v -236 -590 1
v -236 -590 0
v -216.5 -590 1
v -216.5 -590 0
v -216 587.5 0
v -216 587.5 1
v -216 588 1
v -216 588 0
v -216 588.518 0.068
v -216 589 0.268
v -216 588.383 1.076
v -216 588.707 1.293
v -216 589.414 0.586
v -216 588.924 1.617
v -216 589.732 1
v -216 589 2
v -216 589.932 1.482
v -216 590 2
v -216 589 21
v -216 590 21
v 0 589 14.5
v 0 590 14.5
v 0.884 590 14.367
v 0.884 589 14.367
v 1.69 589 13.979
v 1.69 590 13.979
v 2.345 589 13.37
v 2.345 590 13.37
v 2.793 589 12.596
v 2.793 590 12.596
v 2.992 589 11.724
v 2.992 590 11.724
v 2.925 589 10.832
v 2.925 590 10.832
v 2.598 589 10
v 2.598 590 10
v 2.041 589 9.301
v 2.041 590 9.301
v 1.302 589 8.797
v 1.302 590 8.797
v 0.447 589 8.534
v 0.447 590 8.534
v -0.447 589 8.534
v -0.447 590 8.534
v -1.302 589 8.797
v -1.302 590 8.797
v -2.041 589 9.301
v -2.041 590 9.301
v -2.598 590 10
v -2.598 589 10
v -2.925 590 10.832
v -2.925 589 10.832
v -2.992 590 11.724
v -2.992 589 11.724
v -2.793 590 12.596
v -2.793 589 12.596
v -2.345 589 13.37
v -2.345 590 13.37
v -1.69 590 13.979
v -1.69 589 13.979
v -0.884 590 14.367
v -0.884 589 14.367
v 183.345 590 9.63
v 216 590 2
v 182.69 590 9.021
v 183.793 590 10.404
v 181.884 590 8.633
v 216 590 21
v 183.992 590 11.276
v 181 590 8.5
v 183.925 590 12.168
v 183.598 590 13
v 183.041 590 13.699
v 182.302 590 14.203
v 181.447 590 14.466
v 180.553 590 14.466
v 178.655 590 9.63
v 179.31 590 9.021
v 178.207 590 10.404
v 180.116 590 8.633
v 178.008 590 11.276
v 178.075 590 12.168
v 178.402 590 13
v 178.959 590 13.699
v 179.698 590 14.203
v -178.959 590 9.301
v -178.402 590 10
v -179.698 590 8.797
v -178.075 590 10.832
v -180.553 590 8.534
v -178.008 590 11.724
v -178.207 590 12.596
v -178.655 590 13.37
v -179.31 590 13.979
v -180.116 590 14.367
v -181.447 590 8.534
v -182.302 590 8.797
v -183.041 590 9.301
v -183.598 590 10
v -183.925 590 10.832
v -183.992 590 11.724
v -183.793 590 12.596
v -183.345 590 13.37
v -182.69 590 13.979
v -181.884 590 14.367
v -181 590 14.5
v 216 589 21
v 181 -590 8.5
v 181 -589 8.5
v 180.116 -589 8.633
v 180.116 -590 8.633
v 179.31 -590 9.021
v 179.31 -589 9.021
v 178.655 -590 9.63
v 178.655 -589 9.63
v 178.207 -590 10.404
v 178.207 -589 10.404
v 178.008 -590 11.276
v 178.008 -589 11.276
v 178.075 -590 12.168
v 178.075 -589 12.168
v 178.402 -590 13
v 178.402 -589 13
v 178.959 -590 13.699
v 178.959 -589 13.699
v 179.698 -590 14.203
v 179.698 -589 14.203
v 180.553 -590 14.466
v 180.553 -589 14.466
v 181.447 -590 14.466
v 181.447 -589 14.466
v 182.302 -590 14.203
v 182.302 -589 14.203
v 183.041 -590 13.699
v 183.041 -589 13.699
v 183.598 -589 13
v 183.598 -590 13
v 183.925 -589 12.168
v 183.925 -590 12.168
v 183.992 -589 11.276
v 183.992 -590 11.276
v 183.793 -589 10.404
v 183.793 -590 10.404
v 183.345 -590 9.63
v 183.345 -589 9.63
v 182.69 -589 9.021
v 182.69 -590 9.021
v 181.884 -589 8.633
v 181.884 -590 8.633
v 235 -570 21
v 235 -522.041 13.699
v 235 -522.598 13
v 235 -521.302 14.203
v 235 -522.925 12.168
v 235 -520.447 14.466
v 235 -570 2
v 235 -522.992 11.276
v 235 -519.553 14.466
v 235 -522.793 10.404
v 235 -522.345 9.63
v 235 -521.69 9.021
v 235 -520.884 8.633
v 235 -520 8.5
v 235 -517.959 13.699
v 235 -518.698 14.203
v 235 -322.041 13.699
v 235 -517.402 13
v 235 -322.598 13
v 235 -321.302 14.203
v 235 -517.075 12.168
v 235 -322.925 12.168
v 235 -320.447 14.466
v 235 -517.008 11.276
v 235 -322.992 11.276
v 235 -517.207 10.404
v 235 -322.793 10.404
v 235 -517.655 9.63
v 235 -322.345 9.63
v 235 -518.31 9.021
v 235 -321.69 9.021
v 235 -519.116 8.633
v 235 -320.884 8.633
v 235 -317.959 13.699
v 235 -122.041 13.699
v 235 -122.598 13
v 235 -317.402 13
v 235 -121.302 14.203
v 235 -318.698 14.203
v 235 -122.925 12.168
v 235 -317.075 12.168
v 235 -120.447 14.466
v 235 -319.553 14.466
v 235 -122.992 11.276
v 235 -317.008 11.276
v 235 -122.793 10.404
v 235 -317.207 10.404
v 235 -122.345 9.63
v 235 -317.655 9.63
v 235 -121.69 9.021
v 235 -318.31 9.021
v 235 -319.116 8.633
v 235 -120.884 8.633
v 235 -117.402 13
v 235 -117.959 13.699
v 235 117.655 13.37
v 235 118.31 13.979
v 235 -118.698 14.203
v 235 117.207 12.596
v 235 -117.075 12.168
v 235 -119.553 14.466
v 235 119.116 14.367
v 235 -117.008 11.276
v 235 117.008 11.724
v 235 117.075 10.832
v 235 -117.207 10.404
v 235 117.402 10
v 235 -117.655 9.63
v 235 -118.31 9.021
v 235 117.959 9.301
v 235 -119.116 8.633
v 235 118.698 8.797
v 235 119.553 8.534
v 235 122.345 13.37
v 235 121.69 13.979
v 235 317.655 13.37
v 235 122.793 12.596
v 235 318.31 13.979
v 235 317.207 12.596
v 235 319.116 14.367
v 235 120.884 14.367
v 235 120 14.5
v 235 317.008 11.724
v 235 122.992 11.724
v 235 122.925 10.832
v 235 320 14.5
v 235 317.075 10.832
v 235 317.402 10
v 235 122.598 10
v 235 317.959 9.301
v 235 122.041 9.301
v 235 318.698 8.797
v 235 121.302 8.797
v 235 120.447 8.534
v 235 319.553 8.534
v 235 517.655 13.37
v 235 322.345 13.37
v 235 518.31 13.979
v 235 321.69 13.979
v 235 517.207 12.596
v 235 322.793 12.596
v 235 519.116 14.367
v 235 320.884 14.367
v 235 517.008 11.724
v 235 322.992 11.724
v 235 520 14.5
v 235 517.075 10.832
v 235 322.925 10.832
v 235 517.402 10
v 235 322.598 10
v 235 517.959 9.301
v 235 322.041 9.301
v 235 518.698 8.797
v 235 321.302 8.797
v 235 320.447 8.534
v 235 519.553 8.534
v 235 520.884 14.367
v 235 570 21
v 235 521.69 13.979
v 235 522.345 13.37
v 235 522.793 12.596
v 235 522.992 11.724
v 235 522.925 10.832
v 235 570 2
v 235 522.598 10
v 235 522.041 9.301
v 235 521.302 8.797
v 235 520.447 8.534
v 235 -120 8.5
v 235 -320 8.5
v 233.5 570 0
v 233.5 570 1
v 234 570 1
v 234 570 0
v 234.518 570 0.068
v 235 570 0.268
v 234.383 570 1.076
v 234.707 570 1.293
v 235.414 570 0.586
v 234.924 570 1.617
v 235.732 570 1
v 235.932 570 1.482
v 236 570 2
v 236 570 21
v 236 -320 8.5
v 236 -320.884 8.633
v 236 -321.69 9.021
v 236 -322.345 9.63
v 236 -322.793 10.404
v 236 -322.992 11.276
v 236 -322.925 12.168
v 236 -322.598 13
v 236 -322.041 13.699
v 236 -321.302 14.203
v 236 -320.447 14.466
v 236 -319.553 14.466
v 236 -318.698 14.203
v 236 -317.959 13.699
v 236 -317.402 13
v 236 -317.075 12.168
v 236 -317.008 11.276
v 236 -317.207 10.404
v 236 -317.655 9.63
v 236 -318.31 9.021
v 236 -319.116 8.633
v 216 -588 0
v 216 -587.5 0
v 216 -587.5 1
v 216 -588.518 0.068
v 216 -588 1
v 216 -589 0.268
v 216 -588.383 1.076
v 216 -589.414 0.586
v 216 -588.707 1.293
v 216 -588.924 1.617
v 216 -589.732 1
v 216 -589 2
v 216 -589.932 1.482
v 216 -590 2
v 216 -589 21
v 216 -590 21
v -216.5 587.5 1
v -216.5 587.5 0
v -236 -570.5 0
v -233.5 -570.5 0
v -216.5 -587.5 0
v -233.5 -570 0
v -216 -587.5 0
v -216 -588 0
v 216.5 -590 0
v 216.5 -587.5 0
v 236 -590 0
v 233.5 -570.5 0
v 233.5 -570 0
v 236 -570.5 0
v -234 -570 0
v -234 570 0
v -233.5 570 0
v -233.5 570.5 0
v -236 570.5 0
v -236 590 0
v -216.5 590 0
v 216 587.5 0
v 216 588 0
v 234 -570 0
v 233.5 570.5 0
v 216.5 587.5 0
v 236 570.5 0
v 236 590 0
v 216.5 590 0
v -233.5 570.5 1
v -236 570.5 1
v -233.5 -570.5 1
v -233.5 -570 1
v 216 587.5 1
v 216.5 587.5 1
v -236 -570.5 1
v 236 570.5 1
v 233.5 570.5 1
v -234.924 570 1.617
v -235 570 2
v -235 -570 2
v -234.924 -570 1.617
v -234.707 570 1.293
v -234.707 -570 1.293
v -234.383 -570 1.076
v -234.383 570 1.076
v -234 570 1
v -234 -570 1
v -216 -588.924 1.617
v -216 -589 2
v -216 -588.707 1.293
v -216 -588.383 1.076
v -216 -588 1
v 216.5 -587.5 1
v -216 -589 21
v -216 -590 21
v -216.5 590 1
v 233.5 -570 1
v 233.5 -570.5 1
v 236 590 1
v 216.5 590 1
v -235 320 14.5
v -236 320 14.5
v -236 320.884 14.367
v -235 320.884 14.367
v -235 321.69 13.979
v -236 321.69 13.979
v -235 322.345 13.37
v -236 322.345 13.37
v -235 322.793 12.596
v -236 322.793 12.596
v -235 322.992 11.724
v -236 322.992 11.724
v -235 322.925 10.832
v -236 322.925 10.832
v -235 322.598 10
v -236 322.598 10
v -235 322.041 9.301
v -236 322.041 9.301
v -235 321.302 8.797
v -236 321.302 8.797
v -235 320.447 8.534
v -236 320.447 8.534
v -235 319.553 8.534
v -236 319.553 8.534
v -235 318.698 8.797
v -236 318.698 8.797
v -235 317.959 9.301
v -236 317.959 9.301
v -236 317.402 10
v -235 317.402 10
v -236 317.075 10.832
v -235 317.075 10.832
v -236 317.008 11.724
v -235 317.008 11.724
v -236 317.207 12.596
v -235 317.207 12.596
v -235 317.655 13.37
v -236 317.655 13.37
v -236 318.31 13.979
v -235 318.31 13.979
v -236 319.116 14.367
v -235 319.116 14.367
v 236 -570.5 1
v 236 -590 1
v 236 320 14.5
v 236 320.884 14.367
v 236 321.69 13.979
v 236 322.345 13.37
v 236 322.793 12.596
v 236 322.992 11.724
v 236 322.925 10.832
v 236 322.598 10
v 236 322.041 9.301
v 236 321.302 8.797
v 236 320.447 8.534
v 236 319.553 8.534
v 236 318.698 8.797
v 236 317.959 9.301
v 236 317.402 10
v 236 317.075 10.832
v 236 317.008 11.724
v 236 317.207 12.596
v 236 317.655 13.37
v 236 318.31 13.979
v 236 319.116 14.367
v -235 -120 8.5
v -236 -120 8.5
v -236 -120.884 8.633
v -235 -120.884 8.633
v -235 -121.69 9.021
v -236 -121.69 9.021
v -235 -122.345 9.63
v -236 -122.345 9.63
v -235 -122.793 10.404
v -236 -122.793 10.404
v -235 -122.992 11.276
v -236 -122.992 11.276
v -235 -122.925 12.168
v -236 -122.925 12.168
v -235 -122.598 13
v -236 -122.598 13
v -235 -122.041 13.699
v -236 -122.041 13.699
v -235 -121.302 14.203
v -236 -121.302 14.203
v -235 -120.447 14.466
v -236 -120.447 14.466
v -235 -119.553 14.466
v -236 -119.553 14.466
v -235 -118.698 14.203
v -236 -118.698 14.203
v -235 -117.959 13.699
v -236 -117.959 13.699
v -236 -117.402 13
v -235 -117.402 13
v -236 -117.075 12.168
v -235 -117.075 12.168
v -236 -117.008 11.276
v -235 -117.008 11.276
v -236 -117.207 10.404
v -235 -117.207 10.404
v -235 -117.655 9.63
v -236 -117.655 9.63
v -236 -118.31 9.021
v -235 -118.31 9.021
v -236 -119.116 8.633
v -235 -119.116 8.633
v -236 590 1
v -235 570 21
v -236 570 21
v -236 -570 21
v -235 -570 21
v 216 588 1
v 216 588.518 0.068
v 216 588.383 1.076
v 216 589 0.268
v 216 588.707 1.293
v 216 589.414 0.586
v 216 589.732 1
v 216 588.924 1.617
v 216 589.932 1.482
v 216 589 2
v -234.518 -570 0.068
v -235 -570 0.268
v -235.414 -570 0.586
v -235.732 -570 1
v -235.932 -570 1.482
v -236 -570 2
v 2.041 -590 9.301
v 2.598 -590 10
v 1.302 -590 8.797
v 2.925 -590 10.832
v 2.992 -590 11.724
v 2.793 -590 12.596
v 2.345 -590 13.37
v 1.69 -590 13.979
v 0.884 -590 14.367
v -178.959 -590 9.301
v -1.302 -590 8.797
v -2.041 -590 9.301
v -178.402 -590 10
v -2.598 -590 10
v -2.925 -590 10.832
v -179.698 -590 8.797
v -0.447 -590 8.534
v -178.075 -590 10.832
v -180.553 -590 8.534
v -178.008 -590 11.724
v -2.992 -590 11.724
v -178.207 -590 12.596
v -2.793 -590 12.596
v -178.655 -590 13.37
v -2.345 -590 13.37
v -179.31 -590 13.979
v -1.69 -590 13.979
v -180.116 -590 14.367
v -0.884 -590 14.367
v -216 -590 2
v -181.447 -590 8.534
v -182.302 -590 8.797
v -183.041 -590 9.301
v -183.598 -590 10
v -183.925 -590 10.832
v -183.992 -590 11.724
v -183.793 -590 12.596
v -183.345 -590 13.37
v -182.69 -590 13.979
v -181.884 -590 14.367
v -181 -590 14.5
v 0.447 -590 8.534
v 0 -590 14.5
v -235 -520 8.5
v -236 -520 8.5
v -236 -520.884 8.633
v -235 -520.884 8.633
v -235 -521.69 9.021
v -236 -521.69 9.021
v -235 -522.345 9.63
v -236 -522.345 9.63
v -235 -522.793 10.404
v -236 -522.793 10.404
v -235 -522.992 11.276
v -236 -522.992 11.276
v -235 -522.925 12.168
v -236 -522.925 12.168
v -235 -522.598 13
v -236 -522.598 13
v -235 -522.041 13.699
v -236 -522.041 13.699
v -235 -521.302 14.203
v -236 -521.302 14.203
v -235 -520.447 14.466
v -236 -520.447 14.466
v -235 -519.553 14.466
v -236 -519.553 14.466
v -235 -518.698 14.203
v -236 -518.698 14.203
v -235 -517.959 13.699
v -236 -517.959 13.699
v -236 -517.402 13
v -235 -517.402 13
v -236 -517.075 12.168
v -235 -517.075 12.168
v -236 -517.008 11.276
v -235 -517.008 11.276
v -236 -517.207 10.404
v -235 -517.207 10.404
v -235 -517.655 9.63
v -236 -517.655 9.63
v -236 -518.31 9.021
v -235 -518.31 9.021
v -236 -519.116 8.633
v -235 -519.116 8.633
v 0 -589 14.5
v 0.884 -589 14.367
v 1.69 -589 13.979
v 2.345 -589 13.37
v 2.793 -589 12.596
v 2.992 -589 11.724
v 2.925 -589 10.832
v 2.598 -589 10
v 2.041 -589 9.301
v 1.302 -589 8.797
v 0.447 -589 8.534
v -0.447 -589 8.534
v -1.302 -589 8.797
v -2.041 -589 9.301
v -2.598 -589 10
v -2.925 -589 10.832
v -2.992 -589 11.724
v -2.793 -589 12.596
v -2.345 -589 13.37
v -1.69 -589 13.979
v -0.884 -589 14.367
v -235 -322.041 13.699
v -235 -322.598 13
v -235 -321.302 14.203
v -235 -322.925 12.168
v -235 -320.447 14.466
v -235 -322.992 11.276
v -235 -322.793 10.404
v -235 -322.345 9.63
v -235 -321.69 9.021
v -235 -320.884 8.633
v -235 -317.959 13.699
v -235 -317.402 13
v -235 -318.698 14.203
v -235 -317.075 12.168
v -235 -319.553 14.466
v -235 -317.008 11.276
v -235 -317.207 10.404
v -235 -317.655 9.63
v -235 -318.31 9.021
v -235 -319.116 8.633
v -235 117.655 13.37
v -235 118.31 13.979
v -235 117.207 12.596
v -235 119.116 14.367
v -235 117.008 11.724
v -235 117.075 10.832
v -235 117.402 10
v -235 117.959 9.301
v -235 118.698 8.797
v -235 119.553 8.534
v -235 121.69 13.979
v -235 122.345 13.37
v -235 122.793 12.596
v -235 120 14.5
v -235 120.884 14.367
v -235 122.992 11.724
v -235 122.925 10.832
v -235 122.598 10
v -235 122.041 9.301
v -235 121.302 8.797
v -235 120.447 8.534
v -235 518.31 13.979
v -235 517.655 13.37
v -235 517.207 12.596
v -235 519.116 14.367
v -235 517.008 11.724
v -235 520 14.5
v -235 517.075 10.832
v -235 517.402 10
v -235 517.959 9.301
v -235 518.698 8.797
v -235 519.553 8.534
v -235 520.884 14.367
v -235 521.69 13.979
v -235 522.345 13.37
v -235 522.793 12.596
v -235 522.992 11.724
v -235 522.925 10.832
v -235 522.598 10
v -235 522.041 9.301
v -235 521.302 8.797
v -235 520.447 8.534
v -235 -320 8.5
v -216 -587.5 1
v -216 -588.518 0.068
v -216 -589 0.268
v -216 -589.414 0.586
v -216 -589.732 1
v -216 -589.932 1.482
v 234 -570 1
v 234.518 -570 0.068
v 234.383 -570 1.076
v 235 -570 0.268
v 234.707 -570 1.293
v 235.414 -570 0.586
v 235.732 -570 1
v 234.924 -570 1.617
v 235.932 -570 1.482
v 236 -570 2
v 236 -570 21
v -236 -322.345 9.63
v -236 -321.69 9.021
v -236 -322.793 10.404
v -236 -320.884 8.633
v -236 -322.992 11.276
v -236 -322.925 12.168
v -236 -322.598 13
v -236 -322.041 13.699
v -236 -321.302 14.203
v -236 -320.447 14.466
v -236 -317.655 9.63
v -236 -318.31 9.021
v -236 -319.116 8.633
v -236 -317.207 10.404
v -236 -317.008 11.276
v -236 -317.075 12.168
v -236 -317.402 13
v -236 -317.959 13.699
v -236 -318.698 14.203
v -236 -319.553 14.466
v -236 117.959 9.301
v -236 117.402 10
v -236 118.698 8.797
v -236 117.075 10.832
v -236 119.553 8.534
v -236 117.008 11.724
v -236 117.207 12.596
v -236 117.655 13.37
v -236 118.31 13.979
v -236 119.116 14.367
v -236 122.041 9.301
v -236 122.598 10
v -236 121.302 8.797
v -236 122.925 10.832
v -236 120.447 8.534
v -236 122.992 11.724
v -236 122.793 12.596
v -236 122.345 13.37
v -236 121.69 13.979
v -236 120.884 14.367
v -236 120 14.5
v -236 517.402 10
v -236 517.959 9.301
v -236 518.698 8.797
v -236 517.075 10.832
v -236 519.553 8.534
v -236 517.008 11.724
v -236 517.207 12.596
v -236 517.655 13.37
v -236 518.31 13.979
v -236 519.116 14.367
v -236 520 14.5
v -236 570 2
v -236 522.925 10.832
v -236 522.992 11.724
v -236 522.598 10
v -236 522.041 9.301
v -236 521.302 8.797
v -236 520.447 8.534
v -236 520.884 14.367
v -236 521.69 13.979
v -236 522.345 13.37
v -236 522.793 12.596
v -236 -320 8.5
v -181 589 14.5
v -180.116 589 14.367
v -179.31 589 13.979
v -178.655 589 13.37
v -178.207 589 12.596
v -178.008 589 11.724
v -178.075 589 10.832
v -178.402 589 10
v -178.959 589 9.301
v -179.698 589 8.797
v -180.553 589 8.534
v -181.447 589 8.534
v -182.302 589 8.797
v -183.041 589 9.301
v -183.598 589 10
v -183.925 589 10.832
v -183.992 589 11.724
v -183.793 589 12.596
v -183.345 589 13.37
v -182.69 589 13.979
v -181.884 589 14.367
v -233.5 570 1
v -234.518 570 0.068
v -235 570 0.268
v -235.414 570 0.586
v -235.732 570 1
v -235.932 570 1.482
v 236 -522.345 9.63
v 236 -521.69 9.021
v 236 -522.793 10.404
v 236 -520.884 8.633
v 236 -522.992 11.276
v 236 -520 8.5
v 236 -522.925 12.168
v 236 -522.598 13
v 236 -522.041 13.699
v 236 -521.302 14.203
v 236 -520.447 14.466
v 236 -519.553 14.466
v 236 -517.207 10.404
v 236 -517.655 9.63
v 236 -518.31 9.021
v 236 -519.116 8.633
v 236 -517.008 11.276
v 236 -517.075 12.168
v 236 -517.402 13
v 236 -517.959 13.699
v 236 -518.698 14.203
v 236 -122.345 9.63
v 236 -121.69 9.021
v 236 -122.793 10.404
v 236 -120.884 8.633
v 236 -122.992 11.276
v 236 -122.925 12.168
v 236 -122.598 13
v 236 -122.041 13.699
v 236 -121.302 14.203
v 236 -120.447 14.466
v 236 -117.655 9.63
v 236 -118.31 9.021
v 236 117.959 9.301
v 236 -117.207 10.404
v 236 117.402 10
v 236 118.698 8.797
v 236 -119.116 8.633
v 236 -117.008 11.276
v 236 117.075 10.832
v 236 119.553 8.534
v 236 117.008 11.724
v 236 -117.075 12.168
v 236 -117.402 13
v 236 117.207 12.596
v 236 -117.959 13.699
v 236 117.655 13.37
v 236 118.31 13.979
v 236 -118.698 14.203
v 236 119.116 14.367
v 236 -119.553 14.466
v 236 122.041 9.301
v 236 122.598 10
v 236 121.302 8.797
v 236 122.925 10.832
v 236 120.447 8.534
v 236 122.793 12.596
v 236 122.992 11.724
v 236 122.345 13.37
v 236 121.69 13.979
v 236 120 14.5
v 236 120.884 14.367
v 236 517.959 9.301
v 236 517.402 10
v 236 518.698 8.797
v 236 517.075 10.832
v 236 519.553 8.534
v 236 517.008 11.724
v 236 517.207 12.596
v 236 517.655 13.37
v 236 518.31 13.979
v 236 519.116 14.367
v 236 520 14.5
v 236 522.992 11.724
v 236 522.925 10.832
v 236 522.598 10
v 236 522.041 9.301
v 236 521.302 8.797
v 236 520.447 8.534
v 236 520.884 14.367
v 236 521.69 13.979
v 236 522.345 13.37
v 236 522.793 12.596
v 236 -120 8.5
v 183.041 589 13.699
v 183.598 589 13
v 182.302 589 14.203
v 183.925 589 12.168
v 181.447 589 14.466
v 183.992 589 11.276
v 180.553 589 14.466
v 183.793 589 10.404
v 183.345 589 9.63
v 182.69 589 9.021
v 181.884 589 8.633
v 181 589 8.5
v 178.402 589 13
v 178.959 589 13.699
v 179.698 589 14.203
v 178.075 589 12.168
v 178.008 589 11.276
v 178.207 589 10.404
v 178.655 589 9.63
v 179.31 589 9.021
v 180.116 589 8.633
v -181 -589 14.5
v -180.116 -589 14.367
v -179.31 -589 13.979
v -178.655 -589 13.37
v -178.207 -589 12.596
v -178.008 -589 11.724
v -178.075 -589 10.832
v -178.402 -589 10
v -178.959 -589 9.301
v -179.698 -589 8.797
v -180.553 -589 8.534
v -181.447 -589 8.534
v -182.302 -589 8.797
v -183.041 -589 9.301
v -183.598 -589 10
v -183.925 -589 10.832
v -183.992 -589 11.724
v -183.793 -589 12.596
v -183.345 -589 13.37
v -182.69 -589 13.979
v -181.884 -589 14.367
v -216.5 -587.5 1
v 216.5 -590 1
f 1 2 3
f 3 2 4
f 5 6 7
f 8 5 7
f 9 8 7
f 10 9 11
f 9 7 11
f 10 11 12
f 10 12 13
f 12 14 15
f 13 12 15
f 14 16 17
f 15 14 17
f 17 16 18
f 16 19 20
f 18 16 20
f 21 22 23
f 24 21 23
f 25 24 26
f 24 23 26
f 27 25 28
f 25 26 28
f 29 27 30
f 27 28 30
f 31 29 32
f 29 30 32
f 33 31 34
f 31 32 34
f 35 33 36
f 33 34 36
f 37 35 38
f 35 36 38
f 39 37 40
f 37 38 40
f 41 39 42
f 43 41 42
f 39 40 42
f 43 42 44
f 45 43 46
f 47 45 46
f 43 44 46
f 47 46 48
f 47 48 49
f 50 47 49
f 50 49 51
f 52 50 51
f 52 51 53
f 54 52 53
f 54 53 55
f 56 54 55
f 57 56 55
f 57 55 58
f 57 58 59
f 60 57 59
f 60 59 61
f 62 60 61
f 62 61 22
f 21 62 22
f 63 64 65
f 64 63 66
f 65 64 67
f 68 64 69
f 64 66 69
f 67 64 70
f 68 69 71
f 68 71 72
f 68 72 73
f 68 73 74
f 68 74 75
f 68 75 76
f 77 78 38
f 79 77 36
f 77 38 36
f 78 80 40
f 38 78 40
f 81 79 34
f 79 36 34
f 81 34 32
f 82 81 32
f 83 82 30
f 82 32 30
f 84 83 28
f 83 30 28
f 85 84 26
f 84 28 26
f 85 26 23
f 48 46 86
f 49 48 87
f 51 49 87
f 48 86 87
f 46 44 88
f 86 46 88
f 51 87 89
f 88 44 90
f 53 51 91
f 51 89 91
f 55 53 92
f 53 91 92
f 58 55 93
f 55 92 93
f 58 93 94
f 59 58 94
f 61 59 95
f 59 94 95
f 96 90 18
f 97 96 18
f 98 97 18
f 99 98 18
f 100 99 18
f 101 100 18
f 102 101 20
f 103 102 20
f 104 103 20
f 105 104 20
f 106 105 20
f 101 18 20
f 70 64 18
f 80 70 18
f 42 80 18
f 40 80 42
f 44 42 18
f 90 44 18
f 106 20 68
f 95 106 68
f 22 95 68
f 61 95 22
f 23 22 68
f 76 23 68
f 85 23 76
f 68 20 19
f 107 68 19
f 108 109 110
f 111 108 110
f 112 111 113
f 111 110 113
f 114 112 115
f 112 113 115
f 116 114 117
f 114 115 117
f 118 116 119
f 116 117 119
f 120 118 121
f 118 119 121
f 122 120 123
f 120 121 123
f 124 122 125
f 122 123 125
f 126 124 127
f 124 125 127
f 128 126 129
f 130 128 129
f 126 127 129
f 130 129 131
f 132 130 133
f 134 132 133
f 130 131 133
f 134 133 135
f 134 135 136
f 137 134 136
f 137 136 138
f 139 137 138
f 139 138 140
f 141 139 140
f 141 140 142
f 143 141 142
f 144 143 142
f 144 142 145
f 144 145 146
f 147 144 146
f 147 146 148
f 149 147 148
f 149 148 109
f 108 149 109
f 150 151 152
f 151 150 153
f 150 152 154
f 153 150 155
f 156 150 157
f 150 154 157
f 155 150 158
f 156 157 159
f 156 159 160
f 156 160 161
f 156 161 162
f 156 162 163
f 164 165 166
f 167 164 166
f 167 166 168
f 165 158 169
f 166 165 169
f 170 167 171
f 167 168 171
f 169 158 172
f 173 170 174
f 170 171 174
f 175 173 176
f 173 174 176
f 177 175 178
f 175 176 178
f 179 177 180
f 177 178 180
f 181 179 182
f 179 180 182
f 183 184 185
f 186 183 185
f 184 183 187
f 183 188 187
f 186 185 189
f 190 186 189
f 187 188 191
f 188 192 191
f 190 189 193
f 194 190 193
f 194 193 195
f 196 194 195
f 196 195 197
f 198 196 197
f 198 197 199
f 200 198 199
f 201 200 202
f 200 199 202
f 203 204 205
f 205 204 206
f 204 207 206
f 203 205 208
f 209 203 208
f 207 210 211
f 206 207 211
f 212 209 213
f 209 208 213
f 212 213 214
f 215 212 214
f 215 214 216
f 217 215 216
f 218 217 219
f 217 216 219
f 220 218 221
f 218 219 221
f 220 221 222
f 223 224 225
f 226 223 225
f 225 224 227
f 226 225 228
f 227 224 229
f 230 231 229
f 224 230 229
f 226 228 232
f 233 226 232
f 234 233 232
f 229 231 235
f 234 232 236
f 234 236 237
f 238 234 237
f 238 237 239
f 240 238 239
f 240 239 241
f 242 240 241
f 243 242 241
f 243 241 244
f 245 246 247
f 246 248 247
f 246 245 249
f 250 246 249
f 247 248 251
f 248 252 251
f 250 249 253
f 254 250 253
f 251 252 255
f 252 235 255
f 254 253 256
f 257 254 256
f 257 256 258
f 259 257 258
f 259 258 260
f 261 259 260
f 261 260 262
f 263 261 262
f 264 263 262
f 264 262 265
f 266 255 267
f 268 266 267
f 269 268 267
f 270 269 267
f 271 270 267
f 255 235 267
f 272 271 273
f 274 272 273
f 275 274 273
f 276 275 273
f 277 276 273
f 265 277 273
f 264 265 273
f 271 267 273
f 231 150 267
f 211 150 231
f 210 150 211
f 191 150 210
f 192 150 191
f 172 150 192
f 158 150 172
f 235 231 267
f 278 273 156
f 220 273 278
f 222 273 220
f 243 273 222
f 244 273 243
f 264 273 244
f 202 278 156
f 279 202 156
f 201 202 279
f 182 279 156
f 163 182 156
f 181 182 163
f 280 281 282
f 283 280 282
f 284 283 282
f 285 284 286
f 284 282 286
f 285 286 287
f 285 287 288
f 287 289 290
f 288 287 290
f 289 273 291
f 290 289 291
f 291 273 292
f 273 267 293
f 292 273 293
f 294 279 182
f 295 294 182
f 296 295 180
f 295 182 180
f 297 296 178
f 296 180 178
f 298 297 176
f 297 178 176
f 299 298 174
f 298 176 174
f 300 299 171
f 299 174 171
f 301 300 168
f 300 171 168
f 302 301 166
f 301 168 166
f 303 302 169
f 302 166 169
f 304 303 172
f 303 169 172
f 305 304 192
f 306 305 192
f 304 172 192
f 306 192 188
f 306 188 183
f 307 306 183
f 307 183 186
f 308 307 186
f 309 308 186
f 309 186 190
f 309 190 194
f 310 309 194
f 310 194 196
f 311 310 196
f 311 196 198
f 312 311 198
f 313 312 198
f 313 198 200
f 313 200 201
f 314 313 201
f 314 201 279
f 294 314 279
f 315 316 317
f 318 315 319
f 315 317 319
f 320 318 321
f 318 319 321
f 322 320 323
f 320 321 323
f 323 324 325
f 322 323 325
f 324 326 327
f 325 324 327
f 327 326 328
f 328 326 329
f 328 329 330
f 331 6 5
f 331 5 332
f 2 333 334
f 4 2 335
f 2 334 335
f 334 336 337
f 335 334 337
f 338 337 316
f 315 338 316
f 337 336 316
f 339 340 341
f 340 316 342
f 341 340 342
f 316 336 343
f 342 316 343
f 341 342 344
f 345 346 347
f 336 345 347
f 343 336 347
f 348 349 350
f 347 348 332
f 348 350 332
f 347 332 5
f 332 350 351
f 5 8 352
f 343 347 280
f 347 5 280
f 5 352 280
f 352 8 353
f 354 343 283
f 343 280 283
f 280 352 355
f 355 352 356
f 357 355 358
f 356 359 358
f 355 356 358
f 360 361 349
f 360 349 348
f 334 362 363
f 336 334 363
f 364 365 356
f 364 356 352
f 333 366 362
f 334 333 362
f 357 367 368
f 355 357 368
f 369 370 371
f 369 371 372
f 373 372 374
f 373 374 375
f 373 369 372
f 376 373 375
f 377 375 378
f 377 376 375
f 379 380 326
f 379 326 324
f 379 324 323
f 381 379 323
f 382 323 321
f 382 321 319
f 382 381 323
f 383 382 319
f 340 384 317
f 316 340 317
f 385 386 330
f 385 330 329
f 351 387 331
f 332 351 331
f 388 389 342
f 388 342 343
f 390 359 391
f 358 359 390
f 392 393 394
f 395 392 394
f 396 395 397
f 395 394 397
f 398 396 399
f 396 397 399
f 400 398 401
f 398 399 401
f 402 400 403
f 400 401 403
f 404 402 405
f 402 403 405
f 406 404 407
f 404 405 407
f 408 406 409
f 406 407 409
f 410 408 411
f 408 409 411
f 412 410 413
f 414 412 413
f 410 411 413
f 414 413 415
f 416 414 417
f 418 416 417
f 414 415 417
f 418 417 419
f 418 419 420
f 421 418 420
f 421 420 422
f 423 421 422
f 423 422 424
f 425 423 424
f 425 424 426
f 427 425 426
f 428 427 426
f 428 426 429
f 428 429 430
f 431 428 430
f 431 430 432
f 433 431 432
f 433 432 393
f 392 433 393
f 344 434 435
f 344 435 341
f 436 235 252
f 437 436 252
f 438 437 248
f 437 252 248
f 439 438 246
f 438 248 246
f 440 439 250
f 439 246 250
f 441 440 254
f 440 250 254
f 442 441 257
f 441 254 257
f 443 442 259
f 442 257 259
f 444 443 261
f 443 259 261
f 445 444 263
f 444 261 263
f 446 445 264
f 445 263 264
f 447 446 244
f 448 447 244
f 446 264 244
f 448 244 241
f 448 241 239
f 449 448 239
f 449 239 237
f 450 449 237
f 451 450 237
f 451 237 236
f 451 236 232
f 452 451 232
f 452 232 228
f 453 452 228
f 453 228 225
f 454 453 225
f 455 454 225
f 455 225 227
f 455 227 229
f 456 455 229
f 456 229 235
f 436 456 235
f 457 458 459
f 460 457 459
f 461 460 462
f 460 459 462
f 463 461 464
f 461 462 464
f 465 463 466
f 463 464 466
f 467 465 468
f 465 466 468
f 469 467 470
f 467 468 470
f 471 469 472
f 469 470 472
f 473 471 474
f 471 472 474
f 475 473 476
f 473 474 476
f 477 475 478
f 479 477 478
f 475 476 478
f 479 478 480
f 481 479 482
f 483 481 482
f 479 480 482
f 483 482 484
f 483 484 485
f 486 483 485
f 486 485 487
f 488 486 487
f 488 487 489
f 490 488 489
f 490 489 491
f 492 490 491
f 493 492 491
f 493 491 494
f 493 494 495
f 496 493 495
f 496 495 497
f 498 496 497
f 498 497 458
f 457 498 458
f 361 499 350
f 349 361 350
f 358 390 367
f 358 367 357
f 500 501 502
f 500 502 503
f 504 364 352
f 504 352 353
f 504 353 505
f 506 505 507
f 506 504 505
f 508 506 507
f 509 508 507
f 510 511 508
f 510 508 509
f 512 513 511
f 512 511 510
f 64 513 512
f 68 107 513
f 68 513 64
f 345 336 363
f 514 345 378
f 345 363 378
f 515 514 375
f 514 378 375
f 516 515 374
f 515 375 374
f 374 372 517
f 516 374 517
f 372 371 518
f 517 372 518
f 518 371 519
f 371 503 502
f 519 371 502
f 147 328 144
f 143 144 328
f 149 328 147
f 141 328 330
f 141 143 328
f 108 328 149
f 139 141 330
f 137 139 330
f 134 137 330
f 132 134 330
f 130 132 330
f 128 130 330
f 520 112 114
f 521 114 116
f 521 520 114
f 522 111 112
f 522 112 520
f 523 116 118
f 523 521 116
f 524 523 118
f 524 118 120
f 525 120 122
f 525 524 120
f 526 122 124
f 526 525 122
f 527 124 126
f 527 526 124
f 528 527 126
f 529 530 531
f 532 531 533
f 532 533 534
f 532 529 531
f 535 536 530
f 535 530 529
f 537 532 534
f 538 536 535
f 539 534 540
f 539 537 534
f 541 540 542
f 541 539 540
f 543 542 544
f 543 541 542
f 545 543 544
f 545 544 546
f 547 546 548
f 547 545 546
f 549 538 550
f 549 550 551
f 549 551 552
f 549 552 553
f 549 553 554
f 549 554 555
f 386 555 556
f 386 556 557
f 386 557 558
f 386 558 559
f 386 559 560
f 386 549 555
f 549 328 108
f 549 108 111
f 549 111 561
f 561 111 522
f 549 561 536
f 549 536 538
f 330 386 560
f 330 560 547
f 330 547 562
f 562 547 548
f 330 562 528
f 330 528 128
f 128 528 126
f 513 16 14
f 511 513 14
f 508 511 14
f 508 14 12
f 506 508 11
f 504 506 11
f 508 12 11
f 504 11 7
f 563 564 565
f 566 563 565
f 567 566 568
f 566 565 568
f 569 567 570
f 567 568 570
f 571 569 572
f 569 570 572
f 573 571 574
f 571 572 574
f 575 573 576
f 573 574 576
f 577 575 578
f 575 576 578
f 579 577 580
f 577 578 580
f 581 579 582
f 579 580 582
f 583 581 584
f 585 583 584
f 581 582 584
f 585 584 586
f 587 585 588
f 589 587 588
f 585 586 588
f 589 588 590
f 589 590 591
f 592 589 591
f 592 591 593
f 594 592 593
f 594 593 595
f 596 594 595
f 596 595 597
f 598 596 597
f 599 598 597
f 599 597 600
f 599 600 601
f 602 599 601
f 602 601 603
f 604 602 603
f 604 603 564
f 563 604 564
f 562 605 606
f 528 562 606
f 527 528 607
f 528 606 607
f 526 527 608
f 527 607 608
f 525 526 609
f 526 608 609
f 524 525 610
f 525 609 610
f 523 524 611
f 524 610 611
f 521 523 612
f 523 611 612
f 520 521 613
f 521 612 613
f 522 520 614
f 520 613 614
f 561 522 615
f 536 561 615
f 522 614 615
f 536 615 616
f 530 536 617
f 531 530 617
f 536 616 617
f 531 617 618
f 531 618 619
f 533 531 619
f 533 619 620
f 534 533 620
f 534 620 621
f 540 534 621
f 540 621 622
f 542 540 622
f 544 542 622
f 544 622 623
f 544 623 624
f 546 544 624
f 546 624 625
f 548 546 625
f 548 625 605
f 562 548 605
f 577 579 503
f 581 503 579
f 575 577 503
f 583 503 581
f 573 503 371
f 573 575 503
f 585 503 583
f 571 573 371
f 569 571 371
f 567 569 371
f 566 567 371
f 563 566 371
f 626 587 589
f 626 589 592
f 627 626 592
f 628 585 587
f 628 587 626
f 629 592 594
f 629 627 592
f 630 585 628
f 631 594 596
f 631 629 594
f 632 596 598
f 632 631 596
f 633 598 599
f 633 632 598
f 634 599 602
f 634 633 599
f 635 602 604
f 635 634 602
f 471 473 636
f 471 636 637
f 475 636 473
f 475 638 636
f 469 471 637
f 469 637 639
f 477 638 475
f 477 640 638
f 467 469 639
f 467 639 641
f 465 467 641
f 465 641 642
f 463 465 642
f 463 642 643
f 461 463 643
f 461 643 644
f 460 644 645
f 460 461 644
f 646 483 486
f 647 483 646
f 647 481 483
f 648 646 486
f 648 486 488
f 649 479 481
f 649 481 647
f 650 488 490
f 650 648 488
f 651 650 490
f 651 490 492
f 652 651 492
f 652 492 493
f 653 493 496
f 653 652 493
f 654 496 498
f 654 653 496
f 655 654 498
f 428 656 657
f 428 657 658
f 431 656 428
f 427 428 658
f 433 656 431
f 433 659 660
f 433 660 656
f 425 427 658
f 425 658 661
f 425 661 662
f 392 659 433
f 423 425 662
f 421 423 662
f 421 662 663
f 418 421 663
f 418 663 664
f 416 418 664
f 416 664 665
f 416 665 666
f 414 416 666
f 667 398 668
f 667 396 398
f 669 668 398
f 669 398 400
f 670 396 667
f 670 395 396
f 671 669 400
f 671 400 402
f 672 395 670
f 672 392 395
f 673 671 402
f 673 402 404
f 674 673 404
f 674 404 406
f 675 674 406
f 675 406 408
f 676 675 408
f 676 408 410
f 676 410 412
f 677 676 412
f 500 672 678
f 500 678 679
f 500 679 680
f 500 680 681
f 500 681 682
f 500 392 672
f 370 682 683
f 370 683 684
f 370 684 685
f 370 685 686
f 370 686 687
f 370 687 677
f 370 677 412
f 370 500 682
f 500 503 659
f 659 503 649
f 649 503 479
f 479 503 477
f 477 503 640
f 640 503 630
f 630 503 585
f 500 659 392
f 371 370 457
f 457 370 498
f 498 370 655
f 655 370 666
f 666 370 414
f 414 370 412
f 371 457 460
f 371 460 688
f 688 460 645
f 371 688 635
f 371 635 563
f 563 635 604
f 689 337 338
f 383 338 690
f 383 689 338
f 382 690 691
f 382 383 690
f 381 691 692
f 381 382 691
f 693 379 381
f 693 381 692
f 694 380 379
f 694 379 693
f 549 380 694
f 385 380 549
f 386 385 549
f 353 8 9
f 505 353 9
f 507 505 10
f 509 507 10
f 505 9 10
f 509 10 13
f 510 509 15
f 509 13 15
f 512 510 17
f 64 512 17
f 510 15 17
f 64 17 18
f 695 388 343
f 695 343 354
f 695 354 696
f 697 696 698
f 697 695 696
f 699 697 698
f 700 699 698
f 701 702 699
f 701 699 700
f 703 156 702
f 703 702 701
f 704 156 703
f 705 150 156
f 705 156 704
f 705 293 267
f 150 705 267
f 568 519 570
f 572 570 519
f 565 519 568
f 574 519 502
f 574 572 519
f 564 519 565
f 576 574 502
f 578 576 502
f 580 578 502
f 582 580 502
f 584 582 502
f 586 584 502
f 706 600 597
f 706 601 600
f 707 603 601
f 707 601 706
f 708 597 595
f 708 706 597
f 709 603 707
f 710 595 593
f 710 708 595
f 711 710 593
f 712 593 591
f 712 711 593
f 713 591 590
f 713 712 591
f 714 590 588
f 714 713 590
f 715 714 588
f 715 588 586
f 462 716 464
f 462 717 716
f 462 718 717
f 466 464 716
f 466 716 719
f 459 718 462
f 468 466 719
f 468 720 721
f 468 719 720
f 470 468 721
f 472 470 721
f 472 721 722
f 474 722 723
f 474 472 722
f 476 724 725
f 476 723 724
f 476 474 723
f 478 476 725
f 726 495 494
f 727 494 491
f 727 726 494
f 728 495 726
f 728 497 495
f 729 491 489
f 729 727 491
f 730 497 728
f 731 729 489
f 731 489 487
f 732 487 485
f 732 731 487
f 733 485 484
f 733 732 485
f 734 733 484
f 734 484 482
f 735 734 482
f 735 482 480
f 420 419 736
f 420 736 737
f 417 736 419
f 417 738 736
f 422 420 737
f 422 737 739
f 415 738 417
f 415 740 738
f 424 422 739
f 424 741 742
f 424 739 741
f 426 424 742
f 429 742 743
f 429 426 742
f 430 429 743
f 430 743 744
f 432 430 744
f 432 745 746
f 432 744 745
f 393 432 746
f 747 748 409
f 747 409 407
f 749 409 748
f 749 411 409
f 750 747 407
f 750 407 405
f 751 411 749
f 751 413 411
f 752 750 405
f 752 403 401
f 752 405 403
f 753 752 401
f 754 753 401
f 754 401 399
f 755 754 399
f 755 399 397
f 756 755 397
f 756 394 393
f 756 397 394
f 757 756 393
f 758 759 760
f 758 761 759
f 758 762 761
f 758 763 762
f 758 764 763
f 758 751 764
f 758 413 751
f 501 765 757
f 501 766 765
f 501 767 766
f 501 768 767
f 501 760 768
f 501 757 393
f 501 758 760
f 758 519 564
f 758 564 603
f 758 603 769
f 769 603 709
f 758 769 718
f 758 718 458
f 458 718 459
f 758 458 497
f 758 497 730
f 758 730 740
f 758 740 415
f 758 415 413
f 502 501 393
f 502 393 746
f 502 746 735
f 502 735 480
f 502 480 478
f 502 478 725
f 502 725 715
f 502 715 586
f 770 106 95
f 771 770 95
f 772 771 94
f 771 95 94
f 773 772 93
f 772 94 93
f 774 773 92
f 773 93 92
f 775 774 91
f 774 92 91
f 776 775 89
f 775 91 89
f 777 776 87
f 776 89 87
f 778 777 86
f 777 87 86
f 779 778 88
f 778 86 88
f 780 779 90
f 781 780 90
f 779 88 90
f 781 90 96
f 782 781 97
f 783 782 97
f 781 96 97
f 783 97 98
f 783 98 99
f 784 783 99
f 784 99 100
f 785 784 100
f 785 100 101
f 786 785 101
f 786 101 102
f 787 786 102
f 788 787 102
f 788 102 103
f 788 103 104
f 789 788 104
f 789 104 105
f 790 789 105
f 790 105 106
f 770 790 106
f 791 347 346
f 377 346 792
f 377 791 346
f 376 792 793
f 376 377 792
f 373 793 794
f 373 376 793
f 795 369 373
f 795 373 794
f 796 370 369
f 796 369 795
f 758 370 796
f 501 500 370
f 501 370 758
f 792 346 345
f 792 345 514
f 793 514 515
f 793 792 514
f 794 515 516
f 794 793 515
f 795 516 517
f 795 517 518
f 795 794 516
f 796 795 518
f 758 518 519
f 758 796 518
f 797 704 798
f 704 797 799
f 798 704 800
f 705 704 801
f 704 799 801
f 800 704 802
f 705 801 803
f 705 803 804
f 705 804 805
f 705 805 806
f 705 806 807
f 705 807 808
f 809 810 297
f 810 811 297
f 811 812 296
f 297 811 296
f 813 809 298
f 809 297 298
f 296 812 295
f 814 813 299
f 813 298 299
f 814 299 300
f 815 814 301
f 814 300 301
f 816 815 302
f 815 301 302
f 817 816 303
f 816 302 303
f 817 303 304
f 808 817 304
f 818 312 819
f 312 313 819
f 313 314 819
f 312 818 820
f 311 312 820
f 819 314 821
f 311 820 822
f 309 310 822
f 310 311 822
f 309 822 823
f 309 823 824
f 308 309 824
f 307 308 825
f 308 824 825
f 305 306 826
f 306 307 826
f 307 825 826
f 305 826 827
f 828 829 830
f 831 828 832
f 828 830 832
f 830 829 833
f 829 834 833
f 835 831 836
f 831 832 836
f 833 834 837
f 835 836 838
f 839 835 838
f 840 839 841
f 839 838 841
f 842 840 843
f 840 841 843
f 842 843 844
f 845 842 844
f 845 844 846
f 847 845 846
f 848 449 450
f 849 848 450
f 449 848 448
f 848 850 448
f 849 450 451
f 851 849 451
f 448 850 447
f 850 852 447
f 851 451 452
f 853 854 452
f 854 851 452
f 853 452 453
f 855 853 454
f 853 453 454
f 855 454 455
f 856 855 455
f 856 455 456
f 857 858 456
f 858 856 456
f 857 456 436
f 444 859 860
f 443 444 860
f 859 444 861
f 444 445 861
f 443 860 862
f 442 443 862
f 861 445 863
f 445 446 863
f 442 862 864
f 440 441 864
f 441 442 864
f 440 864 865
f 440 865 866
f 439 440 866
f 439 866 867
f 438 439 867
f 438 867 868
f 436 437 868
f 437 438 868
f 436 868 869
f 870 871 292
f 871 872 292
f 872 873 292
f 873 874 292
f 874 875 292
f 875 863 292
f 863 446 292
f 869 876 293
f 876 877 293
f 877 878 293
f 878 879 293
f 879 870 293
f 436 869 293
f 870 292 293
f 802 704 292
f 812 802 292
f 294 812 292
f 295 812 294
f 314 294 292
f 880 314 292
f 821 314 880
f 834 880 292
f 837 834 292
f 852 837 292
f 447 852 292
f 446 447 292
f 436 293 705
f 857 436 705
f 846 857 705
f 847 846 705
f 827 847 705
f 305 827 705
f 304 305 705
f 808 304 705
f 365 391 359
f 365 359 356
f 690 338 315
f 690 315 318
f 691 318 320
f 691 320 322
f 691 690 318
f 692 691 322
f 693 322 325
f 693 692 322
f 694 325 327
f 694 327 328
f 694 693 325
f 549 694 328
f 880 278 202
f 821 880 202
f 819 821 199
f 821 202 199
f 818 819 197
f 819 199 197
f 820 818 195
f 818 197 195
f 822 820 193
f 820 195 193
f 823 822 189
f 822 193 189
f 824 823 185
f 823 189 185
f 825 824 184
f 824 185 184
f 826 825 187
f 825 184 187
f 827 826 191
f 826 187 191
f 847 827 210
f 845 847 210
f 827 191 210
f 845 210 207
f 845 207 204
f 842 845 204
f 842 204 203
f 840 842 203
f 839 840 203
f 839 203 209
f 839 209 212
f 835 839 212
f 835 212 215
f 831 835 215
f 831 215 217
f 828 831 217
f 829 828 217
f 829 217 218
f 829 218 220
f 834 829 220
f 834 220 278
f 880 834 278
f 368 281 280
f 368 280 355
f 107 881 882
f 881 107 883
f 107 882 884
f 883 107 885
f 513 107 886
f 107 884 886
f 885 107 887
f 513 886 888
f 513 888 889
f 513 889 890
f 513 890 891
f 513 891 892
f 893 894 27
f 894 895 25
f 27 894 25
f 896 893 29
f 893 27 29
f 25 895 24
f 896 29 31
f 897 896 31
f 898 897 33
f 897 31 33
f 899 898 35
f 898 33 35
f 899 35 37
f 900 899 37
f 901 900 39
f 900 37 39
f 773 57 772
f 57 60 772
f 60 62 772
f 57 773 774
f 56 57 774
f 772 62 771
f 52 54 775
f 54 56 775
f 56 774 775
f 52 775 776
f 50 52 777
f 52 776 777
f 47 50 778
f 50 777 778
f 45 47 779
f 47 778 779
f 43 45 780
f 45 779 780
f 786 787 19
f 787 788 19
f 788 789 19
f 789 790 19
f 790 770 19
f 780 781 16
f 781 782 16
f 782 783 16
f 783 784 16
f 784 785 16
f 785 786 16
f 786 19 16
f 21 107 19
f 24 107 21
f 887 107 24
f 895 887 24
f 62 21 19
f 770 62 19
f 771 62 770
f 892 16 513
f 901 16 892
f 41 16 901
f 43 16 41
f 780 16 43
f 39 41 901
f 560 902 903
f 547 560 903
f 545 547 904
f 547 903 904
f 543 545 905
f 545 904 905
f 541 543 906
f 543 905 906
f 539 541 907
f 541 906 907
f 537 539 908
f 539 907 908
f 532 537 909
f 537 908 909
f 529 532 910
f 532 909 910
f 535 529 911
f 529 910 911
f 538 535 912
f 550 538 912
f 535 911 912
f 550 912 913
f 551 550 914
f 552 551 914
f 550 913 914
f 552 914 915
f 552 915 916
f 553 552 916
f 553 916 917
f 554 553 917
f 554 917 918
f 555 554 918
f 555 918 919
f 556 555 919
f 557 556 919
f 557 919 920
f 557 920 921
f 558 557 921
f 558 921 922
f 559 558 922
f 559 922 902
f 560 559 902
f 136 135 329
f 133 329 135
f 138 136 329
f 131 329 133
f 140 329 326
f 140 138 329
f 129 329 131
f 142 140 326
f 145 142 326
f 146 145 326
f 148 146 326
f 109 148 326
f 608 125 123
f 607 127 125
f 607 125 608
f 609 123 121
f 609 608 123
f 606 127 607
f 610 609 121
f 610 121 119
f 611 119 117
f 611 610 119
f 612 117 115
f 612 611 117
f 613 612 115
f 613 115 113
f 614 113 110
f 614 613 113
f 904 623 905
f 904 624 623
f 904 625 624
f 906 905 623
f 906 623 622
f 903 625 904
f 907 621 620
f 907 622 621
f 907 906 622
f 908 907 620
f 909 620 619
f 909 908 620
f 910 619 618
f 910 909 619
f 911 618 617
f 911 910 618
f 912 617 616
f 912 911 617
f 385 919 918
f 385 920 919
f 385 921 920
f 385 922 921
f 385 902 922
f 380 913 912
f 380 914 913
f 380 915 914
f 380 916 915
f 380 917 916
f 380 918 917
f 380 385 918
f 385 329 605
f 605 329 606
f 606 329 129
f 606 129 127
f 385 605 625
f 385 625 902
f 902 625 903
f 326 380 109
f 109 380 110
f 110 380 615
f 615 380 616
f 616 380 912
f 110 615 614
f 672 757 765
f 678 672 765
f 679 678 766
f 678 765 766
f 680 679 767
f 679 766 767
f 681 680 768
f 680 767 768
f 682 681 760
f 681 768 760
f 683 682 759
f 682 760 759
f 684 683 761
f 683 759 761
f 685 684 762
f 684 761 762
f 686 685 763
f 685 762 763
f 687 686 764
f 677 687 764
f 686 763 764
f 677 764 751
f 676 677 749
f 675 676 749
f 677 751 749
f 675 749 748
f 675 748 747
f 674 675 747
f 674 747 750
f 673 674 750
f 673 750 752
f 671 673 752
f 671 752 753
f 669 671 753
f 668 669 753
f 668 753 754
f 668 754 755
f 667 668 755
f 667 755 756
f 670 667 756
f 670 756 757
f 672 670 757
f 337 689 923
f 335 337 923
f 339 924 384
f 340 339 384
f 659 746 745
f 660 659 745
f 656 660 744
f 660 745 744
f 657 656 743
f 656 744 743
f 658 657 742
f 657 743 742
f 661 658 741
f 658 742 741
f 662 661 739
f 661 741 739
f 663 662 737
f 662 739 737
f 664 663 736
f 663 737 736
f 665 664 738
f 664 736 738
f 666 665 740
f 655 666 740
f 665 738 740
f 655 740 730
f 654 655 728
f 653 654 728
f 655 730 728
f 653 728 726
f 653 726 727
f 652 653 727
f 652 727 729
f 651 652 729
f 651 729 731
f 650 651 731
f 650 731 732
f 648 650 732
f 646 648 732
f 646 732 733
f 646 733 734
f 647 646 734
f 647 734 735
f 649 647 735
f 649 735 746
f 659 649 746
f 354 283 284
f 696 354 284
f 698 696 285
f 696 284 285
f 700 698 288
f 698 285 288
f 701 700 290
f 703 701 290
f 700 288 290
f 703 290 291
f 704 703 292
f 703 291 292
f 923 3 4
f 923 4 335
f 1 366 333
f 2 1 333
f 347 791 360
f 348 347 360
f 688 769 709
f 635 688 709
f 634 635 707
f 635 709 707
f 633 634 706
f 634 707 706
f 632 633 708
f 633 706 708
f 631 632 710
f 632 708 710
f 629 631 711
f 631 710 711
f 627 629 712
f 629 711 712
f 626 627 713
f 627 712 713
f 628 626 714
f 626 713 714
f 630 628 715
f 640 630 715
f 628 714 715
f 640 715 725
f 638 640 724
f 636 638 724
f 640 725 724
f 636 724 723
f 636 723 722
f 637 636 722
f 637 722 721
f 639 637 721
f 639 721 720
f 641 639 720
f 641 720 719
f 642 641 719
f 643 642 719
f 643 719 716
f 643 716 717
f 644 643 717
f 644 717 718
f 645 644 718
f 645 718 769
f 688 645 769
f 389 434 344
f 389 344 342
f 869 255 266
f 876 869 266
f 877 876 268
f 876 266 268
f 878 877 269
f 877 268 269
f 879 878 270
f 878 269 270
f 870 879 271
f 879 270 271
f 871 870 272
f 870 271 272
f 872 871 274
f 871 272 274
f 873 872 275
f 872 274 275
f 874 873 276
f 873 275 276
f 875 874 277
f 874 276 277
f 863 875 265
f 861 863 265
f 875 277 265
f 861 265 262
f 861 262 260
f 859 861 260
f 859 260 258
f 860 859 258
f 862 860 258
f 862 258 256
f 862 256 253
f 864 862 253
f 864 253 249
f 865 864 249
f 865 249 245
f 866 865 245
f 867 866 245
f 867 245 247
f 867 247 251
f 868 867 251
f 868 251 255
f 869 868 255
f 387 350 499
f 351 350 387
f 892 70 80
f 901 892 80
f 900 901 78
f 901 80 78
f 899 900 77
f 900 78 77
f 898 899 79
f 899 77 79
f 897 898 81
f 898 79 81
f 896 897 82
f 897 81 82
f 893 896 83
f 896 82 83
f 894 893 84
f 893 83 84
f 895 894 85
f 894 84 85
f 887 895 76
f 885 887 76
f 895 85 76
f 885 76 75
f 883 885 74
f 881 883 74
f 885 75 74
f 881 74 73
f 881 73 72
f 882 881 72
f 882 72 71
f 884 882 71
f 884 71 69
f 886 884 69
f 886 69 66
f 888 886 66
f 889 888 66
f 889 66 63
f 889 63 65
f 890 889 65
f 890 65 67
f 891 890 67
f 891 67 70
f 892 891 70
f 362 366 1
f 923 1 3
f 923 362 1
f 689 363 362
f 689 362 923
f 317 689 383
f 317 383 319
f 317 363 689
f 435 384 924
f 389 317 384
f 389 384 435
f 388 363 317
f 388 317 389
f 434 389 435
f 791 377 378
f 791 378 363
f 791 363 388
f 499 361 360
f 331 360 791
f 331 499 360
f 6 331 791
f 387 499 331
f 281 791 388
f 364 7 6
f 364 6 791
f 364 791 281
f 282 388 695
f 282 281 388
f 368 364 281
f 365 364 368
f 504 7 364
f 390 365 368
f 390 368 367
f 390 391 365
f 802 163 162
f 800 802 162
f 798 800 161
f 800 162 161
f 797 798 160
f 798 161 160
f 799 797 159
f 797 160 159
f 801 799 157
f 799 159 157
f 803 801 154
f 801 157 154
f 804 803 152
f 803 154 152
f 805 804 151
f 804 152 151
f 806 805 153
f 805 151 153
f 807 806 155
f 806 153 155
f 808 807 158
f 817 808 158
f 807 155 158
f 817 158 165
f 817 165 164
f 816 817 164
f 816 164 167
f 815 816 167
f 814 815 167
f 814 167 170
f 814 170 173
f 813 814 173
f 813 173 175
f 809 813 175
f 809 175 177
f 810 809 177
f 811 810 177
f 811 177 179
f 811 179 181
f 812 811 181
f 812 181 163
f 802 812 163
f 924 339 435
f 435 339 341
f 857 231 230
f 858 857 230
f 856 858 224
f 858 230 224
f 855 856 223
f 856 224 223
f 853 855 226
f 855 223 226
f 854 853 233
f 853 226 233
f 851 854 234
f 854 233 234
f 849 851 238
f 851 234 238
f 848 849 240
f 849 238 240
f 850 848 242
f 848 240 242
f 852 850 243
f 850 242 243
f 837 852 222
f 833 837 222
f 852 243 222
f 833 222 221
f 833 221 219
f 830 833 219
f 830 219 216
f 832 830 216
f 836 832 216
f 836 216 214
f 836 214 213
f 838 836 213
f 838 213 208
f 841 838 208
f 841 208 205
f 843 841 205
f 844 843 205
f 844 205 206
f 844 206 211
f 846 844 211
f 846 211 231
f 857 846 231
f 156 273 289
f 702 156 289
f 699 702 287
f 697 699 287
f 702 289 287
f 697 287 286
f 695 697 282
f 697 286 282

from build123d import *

# Parameters (mm, degrees)
SKETCH1_W                     = 472
SKETCH1_H                     = 1
BASE_FLANGE1_DEPTH            = 590
EDGE_FLANGE1_STRIP_W          = 6
EDGE_FLANGE1_STRIP_H          = 1
EDGE_FLANGE1_STRIP_CUT_DEPTH  = 432
EDGE_FLANGE1_RELIEF_W         = 6.5
EDGE_FLANGE1_RELIEF_H         = 0.5
EDGE_FLANGE1_RELIEF_CUT_DEPTH = 1
EDGE_FLANGE1_DEPTH            = 432
EDGE_FLANGE2_STRIP_W          = 6
EDGE_FLANGE2_STRIP_H          = 1
EDGE_FLANGE2_STRIP_CUT_DEPTH  = 1140
EDGE_FLANGE2_RELIEF_W         = 6.5
EDGE_FLANGE2_RELIEF_H         = 0.5
EDGE_FLANGE2_RELIEF_CUT_DEPTH = 1
EDGE_FLANGE2_DEPTH            = 1140
SKETCH16_R                    = 3
CUT_EXTRUDE1_DEPTH            = 756.860436853
SKETCH18_R                    = 3
CUT_EXTRUDE2_DEPTH            = 1204.551826886


# Sheet-metal steps are written as plain solids
with BuildPart() as part:
    # Sketch1 → Base-Flange1 (new, symmetric)
    with BuildSketch(Plane(origin=(0, 0, 0), x_dir=(1, 0, 0), z_dir=(0, 1, 0))):
        with Locations((0, -0.5)):
            Rectangle(SKETCH1_W, SKETCH1_H)
    extrude(amount=BASE_FLANGE1_DEPTH, both=True)

    # Edge-Flange1 strip (across the edge) → Edge-Flange1 strip cut (cut)
    with BuildSketch(Plane(origin=(-216, -590, 1), x_dir=(0, 1, 0), z_dir=(1, 0, 0))):
        with Locations((-1, -0.5)):
            Rectangle(EDGE_FLANGE1_STRIP_W, EDGE_FLANGE1_STRIP_H)
    edge_flange1_strip_cut = extrude(amount=EDGE_FLANGE1_STRIP_CUT_DEPTH, mode=Mode.SUBTRACT)

    # Edge-Flange1 relief (on the sheet) → Edge-Flange1 relief cut (cut)
    with BuildSketch(Plane(origin=(-216, -588, 1), x_dir=(0, 1, 0), z_dir=(0, 0, 1))):
        with Locations((-2.75, 0.25)):
            Rectangle(EDGE_FLANGE1_RELIEF_W, EDGE_FLANGE1_RELIEF_H)
        with Locations((-2.75, -432.25)):
            Rectangle(EDGE_FLANGE1_RELIEF_W, EDGE_FLANGE1_RELIEF_H)
    edge_flange1_relief_cut = extrude(amount=-EDGE_FLANGE1_RELIEF_CUT_DEPTH, mode=Mode.SUBTRACT)

    # Edge-Flange1 section (across the edge) → Edge-Flange1 (add)
    with BuildSketch(Plane(origin=(-216, -590, 1), x_dir=(0, 1, 0), z_dir=(1, 0, 0))):
        with BuildLine():
            Line((0, 1), (0, 20))
            Line((0, 20), (1, 20))
            Line((1, 20), (1, 1))
            ThreePointArc((1, 1), (1.292893219, 0.292893219), (2, 0))
            Line((2, 0), (2, -1))
            ThreePointArc((2, -1), (0.585786438, -0.414213562), (0, 1))
        make_face()
    edge_flange1 = extrude(amount=EDGE_FLANGE1_DEPTH)

    # Mirror1: Edge-Flange1 strip cut, Edge-Flange1 relief cut, Edge-Flange1 across plane
    add(edge_flange1_strip_cut.mirror(Plane.ZX), mode=Mode.SUBTRACT)
    add(edge_flange1_relief_cut.mirror(Plane.ZX), mode=Mode.SUBTRACT)
    add(edge_flange1.mirror(Plane.ZX))

    # Edge-Flange2 strip (across the edge) → Edge-Flange2 strip cut (cut)
    with BuildSketch(Plane(origin=(-236, 570, 1), x_dir=(1, 0, 0), z_dir=(0, -1, 0))):
        with Locations((-1, -0.5)):
            Rectangle(EDGE_FLANGE2_STRIP_W, EDGE_FLANGE2_STRIP_H)
    edge_flange2_strip_cut = extrude(amount=EDGE_FLANGE2_STRIP_CUT_DEPTH, mode=Mode.SUBTRACT)

    # Edge-Flange2 relief (on the sheet) → Edge-Flange2 relief cut (cut)
    with BuildSketch(Plane(origin=(-234, 570, 1), x_dir=(1, 0, 0), z_dir=(0, 0, 1))):
        with Locations((-2.75, 0.25)):
            Rectangle(EDGE_FLANGE2_RELIEF_W, EDGE_FLANGE2_RELIEF_H)
        with Locations((-2.75, -1140.25)):
            Rectangle(EDGE_FLANGE2_RELIEF_W, EDGE_FLANGE2_RELIEF_H)
    edge_flange2_relief_cut = extrude(amount=-EDGE_FLANGE2_RELIEF_CUT_DEPTH, mode=Mode.SUBTRACT)

    # Edge-Flange2 section (across the edge) → Edge-Flange2 (add)
    with BuildSketch(Plane(origin=(-236, 570, 1), x_dir=(1, 0, 0), z_dir=(0, -1, 0))):
        with BuildLine():
            Line((0, 1), (0, 20))
            Line((0, 20), (1, 20))
            Line((1, 20), (1, 1))
            ThreePointArc((1, 1), (1.292893219, 0.292893219), (2, 0))
            Line((2, 0), (2, -1))
            ThreePointArc((2, -1), (0.585786438, -0.414213562), (0, 1))
        make_face()
    edge_flange2 = extrude(amount=EDGE_FLANGE2_DEPTH)

    # Mirror2: Edge-Flange2 strip cut, Edge-Flange2 relief cut, Edge-Flange2 across plane
    add(edge_flange2_strip_cut.mirror(Plane(origin=(0, 0, 0), x_dir=(0, 0, 1), z_dir=(1, 0, 0))), mode=Mode.SUBTRACT)
    add(edge_flange2_relief_cut.mirror(Plane(origin=(0, 0, 0), x_dir=(0, 0, 1), z_dir=(1, 0, 0))), mode=Mode.SUBTRACT)
    add(edge_flange2.mirror(Plane(origin=(0, 0, 0), x_dir=(0, 0, 1), z_dir=(1, 0, 0))))

    # Sketch16 → Cut-Extrude1 (cut, through all)
    with BuildSketch(Plane.ZY.offset(236)):
        with Locations((11.5, 520)):
            Circle(SKETCH16_R)
        with Locations((11.5, 320)):
            Circle(SKETCH16_R)
        with Locations((11.5, 120)):
            Circle(SKETCH16_R)
        with Locations(Location((11.5, -120, 0), (0, 0, 180))):
            Circle(SKETCH16_R)
        with Locations(Location((11.5, -320, 0), (0, 0, 180))):
            Circle(SKETCH16_R)
        with Locations(Location((11.5, -520, 0), (0, 0, 180))):
            Circle(SKETCH16_R)
    extrude(amount=-CUT_EXTRUDE1_DEPTH, mode=Mode.SUBTRACT)

    # Sketch18 → Cut-Extrude2 (cut, through all)
    with BuildSketch(Plane(origin=(0, 590, 0), x_dir=(1, 0, 0), z_dir=(0, 1, 0))):
        with Locations(Location((-181, -11.5, 0), (0, 0, 270))):
            Circle(SKETCH18_R)
        with Locations(Location((0, -11.5, 0), (0, 0, 270))):
            Circle(SKETCH18_R)
        with Locations(Location((181, -11.5, 0), (0, 0, 90))):
            Circle(SKETCH18_R)
    extrude(amount=-CUT_EXTRUDE2_DEPTH, mode=Mode.SUBTRACT)


solid = part.part
